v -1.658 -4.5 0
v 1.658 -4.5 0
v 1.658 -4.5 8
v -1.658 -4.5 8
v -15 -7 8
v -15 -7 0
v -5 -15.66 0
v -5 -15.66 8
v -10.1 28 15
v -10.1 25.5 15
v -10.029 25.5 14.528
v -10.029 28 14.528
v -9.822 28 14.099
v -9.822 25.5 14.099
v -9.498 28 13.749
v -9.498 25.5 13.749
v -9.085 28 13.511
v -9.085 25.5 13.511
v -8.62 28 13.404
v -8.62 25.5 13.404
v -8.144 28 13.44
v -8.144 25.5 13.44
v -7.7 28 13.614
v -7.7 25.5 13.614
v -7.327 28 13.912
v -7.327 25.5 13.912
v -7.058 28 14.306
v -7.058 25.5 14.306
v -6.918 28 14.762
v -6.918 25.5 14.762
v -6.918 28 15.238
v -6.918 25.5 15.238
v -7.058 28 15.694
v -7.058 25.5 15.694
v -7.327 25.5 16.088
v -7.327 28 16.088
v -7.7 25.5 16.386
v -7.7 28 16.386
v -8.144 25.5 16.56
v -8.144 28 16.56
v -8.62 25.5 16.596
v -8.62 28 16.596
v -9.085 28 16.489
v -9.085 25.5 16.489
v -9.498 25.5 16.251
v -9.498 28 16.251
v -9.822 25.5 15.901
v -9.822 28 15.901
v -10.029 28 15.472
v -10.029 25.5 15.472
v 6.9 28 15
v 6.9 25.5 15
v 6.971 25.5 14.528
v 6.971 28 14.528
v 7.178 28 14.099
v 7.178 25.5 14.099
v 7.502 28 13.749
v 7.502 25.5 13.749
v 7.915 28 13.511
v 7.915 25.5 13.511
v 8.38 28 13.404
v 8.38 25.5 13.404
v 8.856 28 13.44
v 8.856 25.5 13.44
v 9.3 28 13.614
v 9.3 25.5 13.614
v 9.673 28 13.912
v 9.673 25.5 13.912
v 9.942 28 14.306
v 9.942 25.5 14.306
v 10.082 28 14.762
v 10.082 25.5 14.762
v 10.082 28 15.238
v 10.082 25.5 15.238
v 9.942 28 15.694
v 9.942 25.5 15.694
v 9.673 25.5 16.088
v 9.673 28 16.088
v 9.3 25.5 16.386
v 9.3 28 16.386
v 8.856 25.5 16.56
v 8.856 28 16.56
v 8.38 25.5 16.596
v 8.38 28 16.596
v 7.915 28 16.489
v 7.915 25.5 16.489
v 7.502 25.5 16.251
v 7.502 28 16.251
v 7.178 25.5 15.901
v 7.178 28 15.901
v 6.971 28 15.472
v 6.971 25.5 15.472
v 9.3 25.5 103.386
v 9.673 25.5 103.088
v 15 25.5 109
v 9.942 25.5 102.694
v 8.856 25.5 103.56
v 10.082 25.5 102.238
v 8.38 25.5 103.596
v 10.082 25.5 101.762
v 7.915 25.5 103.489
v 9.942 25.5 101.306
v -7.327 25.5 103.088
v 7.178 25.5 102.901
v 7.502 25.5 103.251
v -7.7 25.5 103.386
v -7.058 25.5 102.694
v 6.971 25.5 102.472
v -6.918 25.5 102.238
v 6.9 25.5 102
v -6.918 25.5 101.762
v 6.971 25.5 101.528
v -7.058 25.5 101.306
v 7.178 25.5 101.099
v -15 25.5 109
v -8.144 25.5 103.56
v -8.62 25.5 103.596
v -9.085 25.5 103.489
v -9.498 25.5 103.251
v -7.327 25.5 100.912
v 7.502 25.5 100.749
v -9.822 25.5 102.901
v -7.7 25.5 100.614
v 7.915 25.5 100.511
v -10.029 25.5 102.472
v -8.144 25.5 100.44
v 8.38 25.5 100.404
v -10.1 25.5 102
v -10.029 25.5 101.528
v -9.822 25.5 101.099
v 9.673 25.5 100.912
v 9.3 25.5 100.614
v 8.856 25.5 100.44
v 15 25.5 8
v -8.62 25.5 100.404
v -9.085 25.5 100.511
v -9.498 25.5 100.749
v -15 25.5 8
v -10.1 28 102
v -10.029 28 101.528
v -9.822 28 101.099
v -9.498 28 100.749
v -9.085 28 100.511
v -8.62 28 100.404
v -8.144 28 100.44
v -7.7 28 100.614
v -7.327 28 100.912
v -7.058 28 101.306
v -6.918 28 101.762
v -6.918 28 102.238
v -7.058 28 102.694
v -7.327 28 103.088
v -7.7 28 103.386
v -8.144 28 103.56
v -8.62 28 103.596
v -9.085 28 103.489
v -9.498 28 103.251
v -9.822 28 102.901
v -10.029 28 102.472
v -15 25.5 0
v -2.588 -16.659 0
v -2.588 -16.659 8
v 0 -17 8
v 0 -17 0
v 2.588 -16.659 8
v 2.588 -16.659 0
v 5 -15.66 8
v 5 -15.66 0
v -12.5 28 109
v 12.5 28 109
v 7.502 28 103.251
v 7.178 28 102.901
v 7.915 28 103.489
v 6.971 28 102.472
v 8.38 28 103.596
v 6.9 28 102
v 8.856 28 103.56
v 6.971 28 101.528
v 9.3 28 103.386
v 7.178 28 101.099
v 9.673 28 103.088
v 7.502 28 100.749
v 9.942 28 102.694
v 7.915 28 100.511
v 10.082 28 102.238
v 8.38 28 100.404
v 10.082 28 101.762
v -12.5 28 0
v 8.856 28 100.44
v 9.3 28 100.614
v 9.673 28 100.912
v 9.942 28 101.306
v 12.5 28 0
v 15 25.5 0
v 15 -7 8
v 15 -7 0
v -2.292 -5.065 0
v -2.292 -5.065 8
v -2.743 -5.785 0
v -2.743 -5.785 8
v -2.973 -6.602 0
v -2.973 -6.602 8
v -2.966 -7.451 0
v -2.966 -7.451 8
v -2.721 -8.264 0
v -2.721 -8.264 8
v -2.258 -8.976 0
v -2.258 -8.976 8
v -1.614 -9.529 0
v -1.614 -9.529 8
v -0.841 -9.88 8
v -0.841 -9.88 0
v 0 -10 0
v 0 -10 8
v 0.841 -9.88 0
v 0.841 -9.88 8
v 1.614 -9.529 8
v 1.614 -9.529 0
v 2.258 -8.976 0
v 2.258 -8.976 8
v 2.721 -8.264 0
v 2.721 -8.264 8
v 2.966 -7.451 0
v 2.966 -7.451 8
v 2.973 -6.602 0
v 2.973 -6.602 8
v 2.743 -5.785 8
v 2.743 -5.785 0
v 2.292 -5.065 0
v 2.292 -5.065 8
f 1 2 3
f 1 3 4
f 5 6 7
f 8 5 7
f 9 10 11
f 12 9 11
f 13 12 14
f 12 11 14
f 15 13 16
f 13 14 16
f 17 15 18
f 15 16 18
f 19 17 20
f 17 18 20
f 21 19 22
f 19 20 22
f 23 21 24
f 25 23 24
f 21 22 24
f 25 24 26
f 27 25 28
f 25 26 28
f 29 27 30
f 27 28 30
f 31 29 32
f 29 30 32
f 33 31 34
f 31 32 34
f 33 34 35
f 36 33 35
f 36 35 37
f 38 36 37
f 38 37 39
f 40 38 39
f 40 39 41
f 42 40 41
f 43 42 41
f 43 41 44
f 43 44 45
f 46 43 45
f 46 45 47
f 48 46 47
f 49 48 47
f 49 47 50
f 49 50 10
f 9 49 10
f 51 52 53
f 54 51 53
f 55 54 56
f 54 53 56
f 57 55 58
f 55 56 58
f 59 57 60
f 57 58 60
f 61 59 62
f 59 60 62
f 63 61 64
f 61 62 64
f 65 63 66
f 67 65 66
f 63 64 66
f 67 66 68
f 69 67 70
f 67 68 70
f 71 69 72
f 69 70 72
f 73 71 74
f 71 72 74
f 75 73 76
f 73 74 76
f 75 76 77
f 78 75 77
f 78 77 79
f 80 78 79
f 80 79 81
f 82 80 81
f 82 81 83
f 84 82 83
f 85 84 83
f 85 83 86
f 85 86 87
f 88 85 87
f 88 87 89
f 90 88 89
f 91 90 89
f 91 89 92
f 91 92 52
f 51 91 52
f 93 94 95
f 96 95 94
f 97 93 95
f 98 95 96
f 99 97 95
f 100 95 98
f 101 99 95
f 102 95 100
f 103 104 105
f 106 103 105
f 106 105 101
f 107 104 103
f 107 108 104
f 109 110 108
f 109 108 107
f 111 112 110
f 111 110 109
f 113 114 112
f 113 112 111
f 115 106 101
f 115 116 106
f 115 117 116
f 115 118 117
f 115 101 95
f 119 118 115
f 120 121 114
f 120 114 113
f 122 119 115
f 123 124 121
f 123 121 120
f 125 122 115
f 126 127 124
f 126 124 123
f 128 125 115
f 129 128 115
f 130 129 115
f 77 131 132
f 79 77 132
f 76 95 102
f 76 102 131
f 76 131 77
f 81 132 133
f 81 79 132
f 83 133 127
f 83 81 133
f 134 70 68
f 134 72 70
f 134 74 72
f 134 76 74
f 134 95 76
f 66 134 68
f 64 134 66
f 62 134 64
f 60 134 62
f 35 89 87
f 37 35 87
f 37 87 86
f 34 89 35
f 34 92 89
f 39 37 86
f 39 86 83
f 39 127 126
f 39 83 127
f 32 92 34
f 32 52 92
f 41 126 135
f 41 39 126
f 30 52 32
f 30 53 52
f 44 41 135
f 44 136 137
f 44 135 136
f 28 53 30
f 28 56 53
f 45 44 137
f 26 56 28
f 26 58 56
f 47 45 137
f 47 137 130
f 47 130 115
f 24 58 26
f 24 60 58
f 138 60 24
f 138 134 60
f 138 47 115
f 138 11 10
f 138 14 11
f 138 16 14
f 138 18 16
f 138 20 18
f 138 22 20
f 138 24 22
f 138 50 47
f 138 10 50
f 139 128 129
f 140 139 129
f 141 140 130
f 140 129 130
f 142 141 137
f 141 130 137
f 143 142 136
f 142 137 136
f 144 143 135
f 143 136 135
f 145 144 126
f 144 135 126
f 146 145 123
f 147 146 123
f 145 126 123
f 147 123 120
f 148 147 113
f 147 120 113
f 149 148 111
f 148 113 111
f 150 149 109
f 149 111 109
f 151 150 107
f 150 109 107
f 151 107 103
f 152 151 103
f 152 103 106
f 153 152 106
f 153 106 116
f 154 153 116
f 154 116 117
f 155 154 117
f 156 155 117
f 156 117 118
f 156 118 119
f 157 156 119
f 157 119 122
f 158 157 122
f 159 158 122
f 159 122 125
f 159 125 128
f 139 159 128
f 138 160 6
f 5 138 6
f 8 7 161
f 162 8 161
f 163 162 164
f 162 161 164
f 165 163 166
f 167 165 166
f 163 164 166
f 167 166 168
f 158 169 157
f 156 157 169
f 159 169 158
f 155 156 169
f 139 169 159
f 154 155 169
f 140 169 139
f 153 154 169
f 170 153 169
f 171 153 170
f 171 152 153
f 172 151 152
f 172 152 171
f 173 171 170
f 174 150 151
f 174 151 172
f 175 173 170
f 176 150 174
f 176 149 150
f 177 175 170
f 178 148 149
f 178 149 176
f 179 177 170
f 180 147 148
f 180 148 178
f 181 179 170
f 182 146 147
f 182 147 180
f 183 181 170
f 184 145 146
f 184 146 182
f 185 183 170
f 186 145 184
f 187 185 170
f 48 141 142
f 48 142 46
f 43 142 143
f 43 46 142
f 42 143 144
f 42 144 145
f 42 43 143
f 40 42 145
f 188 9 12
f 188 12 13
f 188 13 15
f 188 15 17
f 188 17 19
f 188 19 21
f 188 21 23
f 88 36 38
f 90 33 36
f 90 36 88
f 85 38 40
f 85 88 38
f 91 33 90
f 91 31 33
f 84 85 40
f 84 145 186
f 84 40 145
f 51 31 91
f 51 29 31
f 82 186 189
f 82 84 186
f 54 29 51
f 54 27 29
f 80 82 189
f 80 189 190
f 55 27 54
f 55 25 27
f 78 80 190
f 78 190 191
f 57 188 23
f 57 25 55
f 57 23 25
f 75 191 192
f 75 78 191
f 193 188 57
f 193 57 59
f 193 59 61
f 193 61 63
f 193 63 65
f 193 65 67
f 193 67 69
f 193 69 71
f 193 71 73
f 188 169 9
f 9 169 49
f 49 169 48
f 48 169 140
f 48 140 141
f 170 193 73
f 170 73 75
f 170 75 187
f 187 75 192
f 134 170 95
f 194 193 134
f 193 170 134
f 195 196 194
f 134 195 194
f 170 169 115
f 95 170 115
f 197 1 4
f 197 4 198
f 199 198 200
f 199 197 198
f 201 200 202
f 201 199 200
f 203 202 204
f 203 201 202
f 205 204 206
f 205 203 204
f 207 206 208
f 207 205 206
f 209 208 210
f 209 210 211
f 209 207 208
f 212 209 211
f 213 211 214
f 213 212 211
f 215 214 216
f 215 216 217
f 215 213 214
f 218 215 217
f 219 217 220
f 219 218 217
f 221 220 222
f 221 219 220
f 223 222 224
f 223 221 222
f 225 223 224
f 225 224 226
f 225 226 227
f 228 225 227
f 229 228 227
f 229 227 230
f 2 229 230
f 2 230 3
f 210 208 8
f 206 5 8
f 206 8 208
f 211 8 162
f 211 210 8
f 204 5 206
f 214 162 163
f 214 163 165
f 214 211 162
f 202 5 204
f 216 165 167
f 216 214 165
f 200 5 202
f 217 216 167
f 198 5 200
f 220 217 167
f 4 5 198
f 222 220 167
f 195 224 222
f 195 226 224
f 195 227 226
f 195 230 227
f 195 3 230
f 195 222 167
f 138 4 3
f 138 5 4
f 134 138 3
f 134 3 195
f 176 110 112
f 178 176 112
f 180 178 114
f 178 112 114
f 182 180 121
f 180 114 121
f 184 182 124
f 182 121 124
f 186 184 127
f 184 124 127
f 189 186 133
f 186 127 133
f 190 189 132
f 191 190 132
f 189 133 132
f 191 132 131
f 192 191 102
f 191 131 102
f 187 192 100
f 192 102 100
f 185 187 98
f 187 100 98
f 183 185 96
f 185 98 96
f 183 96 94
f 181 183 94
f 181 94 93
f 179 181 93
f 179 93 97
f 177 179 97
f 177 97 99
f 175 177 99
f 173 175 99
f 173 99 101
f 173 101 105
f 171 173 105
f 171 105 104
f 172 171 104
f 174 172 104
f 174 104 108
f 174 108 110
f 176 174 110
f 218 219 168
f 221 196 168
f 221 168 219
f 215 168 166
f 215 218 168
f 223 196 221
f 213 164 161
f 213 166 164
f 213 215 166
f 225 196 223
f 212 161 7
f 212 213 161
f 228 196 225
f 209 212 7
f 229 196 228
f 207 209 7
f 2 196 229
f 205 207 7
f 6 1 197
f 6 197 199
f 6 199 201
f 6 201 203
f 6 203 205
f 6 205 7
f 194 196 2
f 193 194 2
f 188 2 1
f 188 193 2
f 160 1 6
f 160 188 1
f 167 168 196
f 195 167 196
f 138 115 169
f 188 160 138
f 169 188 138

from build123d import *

# Parameters (mm, degrees)
BOSS_EXTRUDE1_DEPTH  = 8
BOSS_EXTRUDE3_DEPTH  = 109
M3_CLEARANCE_SLOT1_D = 3.2


with BuildPart() as part:
    # Sketch1 → Boss-Extrude1 (new body)
    with BuildSketch(Plane.XY):
        with BuildLine():
            Line((15, 25.5), (-15, 25.5))
            Line((-15, 25.5), (-15, -7))
            Line((-15, -7), (-5, -15.660254038))
            ThreePointArc((-5, -15.660254038), (0, -17), (5, -15.660254038))
            Line((5, -15.660254038), (15, -7))
            Line((15, -7), (15, 25.5))
        make_face()
        with BuildLine():
            Line((1.658312395, -4.5), (-1.658312395, -4.5))
            ThreePointArc((-1.658312395, -4.5), (0, -10), (1.658312395, -4.5))
        make_face(mode=Mode.SUBTRACT)
    extrude(amount=BOSS_EXTRUDE1_DEPTH)

    # Sketch1<5> → Boss-Extrude3 (add)
    with BuildSketch(Plane.XY):
        Polygon((-12.5, 28), (12.5, 28), (15, 25.5), (-15, 25.5), align=None)
    extrude(amount=BOSS_EXTRUDE3_DEPTH)

    # M3 Clearance Slot1 (through all)
    with Locations(Plane(origin=(0, 28, 0), x_dir=(1, 0, 0), z_dir=(0, 1, 0))):
        with Locations((-8.5, -15), (8.5, -15), (-8.5, -102), (8.5, -102)):
            Hole(M3_CLEARANCE_SLOT1_D / 2)


solid = part.part
